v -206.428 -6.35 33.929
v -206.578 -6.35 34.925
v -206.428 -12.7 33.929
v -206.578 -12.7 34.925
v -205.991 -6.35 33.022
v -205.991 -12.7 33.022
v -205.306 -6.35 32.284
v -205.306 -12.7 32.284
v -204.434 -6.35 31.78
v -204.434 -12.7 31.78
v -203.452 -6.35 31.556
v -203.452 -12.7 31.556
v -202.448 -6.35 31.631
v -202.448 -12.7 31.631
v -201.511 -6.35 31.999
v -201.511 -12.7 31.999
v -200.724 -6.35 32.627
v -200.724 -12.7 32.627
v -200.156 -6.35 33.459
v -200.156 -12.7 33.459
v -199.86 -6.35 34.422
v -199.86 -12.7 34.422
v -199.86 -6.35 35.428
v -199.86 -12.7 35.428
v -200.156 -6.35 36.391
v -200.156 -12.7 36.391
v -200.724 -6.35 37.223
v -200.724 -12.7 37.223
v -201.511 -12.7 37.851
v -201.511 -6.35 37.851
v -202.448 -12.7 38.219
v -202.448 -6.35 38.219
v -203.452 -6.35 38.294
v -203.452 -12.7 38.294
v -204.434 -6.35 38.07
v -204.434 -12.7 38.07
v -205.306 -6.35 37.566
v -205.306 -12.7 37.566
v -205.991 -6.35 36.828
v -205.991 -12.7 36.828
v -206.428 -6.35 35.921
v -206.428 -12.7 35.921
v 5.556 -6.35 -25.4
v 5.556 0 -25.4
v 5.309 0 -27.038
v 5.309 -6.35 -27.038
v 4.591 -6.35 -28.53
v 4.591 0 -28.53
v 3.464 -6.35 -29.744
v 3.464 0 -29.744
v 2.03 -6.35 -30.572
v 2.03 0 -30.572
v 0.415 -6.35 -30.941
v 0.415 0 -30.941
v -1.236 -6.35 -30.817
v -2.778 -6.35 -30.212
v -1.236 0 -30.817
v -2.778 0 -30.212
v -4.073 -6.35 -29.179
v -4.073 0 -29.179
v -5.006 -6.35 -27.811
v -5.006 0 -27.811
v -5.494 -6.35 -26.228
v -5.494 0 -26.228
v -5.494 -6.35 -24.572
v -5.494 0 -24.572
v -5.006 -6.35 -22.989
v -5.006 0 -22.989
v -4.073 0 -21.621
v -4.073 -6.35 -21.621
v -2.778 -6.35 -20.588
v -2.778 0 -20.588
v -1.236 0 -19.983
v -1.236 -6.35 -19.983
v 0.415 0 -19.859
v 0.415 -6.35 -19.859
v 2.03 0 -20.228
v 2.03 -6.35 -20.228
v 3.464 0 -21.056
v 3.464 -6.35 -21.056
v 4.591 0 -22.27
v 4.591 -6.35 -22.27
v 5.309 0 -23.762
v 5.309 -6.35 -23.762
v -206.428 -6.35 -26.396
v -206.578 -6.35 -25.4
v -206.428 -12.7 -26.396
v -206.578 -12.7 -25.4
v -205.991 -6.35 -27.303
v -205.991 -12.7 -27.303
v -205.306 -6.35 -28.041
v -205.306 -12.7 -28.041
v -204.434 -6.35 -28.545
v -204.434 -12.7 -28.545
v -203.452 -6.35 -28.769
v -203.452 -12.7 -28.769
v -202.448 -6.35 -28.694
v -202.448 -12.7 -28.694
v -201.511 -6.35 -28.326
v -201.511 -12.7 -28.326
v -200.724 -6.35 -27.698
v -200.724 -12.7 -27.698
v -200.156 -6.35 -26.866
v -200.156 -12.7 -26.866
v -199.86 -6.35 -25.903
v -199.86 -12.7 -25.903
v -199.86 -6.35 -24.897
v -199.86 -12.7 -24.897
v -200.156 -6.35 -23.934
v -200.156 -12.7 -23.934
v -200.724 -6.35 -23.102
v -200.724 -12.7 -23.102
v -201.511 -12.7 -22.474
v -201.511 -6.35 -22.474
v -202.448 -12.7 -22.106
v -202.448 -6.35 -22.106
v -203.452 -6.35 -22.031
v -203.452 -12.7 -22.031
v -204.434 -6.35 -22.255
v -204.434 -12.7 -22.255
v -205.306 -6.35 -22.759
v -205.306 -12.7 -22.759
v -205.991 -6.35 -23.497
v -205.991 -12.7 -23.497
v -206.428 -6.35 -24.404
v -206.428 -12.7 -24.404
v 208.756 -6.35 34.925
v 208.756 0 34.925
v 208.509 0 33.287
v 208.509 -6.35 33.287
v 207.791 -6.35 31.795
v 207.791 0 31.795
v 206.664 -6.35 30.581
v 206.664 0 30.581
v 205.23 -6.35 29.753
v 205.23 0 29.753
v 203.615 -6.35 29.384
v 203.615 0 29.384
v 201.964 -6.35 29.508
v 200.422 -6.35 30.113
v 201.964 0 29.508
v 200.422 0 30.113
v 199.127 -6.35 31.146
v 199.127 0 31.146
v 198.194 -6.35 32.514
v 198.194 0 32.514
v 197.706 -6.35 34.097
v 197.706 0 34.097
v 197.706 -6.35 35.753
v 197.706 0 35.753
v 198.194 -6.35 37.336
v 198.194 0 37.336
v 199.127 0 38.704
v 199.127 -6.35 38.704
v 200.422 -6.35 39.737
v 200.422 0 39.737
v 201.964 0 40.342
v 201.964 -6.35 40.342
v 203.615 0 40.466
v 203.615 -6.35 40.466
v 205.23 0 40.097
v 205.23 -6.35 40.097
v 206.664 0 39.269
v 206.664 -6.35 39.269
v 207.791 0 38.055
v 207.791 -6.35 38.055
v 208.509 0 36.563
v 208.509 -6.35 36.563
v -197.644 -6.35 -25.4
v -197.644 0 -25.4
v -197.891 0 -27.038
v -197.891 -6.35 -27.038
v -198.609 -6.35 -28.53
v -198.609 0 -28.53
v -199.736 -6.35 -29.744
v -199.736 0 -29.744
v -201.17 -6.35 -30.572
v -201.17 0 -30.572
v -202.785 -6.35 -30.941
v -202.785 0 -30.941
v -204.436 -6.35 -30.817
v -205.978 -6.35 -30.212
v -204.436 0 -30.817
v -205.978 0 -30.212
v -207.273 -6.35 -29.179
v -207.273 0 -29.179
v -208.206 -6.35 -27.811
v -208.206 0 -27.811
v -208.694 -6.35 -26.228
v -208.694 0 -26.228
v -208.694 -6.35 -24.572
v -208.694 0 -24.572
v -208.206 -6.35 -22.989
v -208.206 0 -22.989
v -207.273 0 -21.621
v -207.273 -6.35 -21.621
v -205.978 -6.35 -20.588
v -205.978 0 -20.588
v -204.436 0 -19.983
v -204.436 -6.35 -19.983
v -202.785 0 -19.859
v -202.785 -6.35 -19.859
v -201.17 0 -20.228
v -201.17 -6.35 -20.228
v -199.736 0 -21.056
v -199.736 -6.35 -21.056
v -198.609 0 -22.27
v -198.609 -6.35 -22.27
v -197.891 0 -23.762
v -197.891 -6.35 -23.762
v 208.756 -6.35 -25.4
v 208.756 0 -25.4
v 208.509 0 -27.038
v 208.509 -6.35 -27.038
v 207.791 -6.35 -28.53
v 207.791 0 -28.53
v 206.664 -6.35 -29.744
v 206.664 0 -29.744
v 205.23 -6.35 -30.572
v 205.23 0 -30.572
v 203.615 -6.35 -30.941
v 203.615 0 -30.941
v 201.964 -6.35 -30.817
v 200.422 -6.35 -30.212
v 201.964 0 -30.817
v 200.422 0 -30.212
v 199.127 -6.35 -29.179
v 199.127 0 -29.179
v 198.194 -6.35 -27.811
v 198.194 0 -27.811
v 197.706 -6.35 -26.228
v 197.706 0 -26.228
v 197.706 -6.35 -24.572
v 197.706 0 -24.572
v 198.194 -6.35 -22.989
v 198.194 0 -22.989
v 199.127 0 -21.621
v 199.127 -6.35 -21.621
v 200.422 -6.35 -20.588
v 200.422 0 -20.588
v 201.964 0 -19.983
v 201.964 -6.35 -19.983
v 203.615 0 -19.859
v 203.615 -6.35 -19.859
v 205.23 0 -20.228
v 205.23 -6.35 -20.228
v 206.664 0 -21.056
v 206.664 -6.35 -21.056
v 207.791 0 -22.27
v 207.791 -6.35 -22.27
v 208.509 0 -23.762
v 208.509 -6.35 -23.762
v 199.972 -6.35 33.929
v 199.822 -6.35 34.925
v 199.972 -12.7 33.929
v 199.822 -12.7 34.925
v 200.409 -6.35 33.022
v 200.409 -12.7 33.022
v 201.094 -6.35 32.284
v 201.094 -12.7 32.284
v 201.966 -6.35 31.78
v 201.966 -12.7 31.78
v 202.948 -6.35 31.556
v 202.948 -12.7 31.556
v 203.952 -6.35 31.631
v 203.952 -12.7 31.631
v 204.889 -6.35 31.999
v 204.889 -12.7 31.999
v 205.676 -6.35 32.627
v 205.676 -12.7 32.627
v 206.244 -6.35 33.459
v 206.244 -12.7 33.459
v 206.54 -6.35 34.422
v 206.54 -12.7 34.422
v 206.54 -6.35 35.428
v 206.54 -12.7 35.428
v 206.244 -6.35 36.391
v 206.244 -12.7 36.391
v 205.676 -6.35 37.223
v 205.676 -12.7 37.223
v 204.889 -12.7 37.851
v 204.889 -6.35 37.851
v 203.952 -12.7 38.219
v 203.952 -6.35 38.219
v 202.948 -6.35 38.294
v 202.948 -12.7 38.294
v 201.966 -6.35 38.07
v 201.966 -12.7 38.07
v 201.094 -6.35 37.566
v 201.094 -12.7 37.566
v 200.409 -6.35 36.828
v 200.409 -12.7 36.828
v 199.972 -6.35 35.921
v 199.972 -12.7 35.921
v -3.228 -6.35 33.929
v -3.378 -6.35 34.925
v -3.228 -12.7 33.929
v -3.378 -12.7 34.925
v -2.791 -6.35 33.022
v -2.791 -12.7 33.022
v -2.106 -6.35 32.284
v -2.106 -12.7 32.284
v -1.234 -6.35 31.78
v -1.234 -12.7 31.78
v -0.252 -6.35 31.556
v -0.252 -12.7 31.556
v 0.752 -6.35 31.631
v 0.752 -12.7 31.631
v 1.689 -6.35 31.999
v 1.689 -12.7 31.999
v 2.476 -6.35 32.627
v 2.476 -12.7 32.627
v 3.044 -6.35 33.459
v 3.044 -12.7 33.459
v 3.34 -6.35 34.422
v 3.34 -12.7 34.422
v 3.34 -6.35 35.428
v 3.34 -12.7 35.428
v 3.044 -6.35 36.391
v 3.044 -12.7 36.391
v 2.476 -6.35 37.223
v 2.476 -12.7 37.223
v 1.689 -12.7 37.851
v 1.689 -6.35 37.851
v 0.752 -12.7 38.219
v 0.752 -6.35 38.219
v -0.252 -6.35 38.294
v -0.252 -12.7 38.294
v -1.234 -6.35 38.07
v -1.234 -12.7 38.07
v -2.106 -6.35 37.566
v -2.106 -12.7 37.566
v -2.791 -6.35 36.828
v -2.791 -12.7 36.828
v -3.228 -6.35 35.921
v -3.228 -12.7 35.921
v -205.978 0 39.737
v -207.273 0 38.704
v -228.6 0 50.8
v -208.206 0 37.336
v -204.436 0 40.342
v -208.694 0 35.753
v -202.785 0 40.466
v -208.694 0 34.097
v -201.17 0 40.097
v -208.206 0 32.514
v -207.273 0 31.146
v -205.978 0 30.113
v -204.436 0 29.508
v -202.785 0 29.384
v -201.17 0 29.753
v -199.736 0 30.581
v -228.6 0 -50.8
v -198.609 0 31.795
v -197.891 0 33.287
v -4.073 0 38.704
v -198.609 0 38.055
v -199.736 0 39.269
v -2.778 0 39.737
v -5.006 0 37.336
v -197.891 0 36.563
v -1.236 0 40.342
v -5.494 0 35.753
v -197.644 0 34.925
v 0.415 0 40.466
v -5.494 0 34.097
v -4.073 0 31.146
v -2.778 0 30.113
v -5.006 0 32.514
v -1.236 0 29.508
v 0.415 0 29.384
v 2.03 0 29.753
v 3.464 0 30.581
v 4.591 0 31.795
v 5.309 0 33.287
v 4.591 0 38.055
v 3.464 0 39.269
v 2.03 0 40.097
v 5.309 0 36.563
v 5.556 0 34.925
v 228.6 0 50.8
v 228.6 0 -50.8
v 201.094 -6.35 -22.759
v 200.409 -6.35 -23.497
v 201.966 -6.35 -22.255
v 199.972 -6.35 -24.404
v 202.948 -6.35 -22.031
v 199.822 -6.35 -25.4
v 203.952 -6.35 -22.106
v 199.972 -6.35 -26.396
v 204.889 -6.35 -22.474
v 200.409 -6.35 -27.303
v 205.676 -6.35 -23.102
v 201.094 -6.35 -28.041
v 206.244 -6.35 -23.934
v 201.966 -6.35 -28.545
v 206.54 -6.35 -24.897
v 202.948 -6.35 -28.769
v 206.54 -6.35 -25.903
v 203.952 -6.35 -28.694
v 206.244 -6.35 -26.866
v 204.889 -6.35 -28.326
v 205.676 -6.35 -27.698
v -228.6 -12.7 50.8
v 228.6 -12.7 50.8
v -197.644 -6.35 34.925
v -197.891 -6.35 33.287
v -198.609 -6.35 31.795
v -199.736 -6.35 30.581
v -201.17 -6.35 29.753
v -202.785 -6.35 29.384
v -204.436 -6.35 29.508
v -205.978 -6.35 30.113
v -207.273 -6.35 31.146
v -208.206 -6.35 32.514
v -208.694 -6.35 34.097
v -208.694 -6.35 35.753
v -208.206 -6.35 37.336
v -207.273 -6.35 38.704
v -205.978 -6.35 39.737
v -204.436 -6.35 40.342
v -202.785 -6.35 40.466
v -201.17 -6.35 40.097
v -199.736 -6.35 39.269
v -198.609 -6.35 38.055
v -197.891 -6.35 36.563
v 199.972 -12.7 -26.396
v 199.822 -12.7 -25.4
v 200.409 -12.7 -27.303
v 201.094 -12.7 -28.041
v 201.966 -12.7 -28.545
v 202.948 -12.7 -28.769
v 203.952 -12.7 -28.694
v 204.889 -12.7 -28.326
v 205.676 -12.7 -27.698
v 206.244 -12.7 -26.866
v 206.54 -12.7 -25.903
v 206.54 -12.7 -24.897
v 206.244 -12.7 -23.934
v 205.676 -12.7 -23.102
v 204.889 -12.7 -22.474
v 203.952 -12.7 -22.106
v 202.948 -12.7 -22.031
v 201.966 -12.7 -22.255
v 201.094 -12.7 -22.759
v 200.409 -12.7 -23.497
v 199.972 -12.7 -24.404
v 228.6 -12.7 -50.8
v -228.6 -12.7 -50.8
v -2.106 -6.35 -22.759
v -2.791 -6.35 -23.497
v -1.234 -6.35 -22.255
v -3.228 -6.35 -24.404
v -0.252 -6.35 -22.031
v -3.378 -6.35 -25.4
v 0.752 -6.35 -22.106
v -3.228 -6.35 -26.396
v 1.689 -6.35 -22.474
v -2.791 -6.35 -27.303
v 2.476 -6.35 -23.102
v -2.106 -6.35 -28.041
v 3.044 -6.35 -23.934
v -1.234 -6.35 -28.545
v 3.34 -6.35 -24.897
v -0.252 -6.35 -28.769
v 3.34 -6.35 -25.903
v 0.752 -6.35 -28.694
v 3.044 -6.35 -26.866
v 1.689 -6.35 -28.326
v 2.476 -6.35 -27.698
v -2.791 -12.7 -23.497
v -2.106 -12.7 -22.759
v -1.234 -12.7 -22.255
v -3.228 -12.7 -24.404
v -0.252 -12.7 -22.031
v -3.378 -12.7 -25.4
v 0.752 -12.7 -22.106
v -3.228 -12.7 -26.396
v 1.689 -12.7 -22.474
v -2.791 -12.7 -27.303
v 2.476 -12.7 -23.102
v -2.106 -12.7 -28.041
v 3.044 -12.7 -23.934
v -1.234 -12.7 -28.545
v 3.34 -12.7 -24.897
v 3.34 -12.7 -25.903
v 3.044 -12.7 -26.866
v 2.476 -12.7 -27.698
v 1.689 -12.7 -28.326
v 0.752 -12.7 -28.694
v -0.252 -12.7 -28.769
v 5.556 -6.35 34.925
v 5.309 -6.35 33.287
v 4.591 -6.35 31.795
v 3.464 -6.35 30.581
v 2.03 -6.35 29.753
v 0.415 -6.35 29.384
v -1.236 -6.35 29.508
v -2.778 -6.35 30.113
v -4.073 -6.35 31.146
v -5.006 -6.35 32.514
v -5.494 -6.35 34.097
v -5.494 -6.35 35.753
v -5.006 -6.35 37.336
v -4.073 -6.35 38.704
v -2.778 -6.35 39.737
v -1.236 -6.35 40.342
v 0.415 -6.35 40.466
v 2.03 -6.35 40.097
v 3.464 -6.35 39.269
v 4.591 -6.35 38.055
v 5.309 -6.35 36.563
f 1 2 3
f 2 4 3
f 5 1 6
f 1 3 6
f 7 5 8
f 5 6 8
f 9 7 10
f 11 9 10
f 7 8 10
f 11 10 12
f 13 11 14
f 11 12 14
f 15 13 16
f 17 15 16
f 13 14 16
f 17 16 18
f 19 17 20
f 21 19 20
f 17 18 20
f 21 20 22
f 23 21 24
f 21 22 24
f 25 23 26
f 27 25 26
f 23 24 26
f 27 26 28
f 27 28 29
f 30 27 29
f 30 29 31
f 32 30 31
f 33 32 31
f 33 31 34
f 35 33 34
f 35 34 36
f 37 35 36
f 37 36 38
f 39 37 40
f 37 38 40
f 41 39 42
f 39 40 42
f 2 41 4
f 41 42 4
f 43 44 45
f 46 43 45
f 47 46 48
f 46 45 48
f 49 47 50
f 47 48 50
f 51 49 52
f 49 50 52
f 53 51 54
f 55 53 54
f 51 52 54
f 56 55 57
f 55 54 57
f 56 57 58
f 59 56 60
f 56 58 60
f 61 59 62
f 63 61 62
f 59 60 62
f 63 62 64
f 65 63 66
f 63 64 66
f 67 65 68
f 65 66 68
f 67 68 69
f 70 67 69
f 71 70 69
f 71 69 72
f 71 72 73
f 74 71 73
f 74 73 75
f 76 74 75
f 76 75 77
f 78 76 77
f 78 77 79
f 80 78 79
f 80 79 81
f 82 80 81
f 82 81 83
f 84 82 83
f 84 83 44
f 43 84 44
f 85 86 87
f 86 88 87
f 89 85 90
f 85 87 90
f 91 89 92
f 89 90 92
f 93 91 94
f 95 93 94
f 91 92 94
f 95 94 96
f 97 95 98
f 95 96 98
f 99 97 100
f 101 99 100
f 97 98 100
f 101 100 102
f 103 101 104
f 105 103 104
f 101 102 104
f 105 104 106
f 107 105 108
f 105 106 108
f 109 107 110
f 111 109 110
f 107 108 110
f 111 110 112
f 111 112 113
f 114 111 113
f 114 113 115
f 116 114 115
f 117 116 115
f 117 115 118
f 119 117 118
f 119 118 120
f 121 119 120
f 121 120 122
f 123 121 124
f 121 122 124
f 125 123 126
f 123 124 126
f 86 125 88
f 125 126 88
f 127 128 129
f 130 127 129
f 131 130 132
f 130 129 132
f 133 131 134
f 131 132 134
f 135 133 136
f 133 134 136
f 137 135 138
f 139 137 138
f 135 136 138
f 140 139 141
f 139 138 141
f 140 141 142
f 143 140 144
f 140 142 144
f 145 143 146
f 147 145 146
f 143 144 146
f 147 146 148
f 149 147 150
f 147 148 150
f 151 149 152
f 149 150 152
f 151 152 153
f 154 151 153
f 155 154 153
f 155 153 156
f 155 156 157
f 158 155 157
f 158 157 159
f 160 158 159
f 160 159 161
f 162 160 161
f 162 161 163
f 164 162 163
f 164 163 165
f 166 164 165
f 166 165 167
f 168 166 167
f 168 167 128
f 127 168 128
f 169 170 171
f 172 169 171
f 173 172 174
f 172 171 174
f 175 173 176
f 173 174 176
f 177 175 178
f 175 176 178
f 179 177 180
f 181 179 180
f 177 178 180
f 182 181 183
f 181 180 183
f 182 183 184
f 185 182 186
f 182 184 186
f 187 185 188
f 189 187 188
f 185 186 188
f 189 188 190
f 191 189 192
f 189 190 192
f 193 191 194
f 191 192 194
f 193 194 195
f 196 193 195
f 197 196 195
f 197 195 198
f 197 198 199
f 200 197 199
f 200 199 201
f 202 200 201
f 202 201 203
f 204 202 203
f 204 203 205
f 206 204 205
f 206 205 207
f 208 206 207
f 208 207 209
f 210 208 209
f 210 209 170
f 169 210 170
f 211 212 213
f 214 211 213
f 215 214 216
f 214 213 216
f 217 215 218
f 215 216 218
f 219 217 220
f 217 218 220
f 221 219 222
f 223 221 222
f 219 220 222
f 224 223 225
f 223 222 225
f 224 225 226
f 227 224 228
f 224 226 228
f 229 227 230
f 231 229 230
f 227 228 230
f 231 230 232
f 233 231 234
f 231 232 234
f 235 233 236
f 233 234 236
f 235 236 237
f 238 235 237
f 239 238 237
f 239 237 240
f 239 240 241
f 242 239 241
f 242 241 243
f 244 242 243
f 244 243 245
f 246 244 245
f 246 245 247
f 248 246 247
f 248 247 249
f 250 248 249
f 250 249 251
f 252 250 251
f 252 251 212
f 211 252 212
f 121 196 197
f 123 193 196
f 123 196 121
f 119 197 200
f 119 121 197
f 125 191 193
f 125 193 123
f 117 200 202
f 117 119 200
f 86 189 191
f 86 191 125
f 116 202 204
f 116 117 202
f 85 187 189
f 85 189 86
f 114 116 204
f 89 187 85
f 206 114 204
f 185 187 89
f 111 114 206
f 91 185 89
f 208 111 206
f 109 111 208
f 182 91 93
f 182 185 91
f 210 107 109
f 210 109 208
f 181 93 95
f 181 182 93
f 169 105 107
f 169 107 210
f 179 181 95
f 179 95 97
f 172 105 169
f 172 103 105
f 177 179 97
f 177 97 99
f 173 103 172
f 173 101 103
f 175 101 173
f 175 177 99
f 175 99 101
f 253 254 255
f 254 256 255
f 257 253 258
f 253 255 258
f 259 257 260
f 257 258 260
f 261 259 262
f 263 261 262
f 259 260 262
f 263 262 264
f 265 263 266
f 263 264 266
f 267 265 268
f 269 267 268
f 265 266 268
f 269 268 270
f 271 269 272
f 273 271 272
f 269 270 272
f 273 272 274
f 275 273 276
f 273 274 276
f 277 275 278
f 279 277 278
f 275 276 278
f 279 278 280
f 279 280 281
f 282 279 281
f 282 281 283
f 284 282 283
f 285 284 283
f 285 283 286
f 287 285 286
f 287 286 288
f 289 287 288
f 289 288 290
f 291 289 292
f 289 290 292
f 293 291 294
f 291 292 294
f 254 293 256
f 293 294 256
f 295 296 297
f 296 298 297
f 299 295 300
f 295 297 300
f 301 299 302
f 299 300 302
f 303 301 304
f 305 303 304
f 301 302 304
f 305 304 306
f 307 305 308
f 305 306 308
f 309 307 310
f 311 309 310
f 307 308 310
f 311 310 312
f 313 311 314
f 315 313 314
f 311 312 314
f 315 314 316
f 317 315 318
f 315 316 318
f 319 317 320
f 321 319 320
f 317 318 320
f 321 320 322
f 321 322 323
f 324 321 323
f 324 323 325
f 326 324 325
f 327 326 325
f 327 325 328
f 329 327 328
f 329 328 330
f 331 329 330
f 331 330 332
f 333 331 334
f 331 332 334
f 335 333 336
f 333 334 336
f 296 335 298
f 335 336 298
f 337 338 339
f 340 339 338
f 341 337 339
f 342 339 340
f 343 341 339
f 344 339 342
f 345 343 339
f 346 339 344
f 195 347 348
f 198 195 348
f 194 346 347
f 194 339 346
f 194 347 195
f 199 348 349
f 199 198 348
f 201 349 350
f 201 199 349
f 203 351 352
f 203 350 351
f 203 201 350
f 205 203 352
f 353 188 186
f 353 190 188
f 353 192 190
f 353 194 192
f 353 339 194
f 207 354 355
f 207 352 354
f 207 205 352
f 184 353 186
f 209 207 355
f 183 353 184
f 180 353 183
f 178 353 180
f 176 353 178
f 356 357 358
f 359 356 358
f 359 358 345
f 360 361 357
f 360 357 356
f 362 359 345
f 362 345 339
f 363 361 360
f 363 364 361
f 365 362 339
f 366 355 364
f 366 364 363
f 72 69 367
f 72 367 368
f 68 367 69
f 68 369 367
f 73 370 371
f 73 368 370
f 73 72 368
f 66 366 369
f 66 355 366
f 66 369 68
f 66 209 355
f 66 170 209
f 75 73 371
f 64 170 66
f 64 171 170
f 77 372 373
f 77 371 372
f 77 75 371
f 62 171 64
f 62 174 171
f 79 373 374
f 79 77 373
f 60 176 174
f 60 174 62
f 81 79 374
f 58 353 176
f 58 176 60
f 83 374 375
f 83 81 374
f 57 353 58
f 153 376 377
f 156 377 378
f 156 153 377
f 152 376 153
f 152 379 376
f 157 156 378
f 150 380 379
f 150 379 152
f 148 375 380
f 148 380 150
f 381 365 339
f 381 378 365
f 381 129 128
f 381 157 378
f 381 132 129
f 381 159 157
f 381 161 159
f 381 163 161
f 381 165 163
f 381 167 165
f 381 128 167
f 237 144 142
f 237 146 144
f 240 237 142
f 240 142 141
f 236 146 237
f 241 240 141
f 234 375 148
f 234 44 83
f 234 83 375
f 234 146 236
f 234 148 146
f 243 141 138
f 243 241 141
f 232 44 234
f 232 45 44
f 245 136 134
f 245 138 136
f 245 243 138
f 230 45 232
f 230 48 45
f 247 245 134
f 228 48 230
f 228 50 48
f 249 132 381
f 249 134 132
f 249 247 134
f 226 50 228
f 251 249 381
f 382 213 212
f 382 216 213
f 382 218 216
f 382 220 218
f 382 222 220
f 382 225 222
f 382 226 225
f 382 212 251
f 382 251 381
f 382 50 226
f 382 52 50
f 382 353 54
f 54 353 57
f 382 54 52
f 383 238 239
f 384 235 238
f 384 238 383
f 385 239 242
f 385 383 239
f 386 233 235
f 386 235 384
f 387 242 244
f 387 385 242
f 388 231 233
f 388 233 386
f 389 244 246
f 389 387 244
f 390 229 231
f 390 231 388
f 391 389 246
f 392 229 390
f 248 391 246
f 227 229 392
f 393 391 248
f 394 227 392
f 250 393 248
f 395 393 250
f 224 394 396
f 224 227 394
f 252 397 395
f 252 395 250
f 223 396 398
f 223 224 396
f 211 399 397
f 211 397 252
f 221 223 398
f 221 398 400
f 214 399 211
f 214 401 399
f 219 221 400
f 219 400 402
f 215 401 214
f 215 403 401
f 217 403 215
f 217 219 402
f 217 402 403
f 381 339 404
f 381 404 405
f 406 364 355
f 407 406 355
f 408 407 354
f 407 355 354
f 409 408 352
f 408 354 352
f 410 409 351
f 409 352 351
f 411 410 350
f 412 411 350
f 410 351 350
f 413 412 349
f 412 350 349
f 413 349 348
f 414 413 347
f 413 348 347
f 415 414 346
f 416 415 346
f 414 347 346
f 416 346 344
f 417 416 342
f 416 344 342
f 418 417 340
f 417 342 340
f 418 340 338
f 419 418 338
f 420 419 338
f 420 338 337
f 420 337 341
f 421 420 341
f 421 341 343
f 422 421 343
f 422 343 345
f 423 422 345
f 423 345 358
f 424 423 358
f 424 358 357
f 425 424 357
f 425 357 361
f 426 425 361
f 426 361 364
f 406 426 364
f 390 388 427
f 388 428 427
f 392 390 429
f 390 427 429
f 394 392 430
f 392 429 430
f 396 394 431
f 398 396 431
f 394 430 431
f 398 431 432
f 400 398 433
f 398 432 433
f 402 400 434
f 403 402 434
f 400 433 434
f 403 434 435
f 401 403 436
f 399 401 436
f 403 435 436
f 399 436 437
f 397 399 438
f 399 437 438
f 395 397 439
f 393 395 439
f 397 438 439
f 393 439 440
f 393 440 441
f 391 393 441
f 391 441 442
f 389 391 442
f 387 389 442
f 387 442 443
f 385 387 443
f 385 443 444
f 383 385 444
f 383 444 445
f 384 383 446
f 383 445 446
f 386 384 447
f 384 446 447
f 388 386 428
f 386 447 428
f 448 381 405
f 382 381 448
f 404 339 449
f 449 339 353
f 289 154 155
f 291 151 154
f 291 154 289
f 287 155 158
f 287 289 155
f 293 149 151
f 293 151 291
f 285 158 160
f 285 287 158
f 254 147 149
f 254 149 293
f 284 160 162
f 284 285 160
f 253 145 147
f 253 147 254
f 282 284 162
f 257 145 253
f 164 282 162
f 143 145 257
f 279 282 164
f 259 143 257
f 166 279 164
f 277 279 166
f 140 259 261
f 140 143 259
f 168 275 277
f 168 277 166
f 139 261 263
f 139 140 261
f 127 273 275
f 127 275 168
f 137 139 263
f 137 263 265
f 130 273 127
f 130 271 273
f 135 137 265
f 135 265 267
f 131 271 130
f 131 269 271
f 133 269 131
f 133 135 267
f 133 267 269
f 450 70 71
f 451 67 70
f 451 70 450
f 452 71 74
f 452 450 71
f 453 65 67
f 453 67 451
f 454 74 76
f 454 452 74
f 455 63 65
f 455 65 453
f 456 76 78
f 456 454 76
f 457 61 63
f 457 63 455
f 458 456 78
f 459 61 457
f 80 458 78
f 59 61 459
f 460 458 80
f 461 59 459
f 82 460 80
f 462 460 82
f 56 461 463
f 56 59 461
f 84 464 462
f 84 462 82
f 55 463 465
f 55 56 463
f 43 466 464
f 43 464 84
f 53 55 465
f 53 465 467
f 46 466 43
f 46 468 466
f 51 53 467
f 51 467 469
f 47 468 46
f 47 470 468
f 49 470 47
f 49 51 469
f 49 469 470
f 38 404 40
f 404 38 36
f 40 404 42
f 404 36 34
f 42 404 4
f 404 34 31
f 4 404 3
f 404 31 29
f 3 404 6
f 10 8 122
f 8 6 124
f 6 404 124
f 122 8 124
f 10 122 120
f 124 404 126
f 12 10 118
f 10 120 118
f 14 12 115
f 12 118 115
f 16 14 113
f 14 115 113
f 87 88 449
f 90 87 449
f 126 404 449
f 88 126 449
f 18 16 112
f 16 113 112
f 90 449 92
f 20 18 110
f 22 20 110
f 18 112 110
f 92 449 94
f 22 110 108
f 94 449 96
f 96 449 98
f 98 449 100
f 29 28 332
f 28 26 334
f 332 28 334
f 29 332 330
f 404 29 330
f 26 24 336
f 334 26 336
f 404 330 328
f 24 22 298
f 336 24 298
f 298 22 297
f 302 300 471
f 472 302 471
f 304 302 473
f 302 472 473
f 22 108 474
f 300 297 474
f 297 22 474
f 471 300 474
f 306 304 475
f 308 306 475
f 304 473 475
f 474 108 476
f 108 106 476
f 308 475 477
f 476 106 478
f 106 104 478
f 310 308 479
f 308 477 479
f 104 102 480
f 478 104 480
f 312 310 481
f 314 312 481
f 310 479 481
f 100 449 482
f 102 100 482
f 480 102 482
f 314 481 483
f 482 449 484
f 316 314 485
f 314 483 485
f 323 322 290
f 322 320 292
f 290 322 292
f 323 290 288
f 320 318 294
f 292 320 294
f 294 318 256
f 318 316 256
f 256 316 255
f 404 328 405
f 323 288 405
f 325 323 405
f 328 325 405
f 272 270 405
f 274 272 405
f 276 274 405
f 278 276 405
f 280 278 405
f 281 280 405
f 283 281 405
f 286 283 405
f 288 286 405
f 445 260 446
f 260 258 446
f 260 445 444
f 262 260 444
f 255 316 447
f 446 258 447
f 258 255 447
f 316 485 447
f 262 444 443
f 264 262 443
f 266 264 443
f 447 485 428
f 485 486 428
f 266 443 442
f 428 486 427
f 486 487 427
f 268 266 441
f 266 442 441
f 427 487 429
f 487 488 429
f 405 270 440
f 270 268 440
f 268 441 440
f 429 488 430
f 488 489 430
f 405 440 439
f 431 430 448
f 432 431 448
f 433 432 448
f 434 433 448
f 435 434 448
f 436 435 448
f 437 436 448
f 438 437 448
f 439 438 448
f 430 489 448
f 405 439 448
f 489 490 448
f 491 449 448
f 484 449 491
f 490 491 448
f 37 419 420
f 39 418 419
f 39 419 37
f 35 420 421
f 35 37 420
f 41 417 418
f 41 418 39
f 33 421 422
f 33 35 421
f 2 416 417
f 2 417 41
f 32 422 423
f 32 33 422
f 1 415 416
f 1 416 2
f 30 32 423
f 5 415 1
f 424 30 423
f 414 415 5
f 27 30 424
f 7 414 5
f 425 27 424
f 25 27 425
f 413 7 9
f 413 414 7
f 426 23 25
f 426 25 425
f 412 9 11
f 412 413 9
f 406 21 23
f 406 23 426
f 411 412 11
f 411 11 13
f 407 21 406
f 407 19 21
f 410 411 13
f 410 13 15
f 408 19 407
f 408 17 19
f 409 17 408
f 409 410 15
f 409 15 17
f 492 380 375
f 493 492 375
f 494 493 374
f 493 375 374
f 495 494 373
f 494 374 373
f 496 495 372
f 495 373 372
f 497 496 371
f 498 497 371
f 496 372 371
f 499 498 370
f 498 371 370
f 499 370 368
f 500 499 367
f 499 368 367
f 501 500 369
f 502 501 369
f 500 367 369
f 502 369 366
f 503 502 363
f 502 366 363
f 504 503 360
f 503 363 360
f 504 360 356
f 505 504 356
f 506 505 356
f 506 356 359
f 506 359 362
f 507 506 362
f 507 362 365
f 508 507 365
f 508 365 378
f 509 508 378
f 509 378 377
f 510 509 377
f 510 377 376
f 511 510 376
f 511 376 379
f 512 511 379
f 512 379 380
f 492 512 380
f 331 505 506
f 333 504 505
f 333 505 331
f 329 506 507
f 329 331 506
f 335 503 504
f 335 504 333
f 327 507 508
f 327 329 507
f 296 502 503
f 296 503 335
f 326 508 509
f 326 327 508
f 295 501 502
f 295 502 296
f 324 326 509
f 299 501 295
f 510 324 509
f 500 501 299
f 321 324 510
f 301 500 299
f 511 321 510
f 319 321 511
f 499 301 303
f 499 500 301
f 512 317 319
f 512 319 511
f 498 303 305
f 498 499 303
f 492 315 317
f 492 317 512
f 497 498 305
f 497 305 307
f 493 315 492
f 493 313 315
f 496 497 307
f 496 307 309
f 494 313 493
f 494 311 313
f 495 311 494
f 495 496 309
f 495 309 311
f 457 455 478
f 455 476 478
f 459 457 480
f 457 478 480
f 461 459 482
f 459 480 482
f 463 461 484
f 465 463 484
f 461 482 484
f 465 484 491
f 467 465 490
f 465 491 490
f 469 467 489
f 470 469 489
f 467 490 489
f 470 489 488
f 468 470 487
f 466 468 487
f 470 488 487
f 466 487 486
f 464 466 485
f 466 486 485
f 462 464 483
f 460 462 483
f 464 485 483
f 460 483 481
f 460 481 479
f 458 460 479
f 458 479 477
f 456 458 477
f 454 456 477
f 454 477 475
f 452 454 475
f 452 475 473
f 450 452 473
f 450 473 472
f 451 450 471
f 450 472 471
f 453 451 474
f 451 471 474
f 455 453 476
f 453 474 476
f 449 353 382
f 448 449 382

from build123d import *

# Parameters (mm, degrees)
SKETCH1_W                                        = 457.2
SKETCH1_H                                        = 101.6
BOSS_EXTRUDE1_DEPTH                              = 12.7
CBORE_FOR_1_4_SOCKET_HEAD_CAP_SCREW1_D           = 6.7564
CBORE_FOR_1_4_SOCKET_HEAD_CAP_SCREW1_DEPTH       = 14.480172657
CBORE_FOR_1_4_SOCKET_HEAD_CAP_SCREW1_CBORE_D     = 11.1125
CBORE_FOR_1_4_SOCKET_HEAD_CAP_SCREW1_CBORE_DEPTH = 6.35
CBORE_FOR_1_4_SOCKET_HEAD_CAP_SCREW1_TIP         = 2.029827343


with BuildPart() as part:
    # Sketch1 → Boss-Extrude1 (new body)
    with BuildSketch(Plane(origin=(0, 0, 0), x_dir=(1, 0, 0), z_dir=(0, 1, 0))):
        Rectangle(SKETCH1_W, SKETCH1_H)
    extrude(amount=-BOSS_EXTRUDE1_DEPTH)

    # CBORE for 1/4 Socket Head Cap Screw1
    with Locations(Plane(origin=(0, 0, 0), x_dir=(1, 0, 0), z_dir=(0, 1, 0))):
        with Locations((-203.2, 25.4), (-203.2, -34.925), (0, -34.925), (0, 25.4), (203.2, 25.4), (203.2, -34.925)):
            CounterBoreHole(CBORE_FOR_1_4_SOCKET_HEAD_CAP_SCREW1_D / 2, CBORE_FOR_1_4_SOCKET_HEAD_CAP_SCREW1_CBORE_D / 2, CBORE_FOR_1_4_SOCKET_HEAD_CAP_SCREW1_CBORE_DEPTH, depth=CBORE_FOR_1_4_SOCKET_HEAD_CAP_SCREW1_DEPTH)
            with Locations((0, 0, -(CBORE_FOR_1_4_SOCKET_HEAD_CAP_SCREW1_DEPTH + CBORE_FOR_1_4_SOCKET_HEAD_CAP_SCREW1_TIP / 2))):  # 118° drill point
                Cone(0, CBORE_FOR_1_4_SOCKET_HEAD_CAP_SCREW1_D / 2, CBORE_FOR_1_4_SOCKET_HEAD_CAP_SCREW1_TIP, mode=Mode.SUBTRACT)


solid = part.part
